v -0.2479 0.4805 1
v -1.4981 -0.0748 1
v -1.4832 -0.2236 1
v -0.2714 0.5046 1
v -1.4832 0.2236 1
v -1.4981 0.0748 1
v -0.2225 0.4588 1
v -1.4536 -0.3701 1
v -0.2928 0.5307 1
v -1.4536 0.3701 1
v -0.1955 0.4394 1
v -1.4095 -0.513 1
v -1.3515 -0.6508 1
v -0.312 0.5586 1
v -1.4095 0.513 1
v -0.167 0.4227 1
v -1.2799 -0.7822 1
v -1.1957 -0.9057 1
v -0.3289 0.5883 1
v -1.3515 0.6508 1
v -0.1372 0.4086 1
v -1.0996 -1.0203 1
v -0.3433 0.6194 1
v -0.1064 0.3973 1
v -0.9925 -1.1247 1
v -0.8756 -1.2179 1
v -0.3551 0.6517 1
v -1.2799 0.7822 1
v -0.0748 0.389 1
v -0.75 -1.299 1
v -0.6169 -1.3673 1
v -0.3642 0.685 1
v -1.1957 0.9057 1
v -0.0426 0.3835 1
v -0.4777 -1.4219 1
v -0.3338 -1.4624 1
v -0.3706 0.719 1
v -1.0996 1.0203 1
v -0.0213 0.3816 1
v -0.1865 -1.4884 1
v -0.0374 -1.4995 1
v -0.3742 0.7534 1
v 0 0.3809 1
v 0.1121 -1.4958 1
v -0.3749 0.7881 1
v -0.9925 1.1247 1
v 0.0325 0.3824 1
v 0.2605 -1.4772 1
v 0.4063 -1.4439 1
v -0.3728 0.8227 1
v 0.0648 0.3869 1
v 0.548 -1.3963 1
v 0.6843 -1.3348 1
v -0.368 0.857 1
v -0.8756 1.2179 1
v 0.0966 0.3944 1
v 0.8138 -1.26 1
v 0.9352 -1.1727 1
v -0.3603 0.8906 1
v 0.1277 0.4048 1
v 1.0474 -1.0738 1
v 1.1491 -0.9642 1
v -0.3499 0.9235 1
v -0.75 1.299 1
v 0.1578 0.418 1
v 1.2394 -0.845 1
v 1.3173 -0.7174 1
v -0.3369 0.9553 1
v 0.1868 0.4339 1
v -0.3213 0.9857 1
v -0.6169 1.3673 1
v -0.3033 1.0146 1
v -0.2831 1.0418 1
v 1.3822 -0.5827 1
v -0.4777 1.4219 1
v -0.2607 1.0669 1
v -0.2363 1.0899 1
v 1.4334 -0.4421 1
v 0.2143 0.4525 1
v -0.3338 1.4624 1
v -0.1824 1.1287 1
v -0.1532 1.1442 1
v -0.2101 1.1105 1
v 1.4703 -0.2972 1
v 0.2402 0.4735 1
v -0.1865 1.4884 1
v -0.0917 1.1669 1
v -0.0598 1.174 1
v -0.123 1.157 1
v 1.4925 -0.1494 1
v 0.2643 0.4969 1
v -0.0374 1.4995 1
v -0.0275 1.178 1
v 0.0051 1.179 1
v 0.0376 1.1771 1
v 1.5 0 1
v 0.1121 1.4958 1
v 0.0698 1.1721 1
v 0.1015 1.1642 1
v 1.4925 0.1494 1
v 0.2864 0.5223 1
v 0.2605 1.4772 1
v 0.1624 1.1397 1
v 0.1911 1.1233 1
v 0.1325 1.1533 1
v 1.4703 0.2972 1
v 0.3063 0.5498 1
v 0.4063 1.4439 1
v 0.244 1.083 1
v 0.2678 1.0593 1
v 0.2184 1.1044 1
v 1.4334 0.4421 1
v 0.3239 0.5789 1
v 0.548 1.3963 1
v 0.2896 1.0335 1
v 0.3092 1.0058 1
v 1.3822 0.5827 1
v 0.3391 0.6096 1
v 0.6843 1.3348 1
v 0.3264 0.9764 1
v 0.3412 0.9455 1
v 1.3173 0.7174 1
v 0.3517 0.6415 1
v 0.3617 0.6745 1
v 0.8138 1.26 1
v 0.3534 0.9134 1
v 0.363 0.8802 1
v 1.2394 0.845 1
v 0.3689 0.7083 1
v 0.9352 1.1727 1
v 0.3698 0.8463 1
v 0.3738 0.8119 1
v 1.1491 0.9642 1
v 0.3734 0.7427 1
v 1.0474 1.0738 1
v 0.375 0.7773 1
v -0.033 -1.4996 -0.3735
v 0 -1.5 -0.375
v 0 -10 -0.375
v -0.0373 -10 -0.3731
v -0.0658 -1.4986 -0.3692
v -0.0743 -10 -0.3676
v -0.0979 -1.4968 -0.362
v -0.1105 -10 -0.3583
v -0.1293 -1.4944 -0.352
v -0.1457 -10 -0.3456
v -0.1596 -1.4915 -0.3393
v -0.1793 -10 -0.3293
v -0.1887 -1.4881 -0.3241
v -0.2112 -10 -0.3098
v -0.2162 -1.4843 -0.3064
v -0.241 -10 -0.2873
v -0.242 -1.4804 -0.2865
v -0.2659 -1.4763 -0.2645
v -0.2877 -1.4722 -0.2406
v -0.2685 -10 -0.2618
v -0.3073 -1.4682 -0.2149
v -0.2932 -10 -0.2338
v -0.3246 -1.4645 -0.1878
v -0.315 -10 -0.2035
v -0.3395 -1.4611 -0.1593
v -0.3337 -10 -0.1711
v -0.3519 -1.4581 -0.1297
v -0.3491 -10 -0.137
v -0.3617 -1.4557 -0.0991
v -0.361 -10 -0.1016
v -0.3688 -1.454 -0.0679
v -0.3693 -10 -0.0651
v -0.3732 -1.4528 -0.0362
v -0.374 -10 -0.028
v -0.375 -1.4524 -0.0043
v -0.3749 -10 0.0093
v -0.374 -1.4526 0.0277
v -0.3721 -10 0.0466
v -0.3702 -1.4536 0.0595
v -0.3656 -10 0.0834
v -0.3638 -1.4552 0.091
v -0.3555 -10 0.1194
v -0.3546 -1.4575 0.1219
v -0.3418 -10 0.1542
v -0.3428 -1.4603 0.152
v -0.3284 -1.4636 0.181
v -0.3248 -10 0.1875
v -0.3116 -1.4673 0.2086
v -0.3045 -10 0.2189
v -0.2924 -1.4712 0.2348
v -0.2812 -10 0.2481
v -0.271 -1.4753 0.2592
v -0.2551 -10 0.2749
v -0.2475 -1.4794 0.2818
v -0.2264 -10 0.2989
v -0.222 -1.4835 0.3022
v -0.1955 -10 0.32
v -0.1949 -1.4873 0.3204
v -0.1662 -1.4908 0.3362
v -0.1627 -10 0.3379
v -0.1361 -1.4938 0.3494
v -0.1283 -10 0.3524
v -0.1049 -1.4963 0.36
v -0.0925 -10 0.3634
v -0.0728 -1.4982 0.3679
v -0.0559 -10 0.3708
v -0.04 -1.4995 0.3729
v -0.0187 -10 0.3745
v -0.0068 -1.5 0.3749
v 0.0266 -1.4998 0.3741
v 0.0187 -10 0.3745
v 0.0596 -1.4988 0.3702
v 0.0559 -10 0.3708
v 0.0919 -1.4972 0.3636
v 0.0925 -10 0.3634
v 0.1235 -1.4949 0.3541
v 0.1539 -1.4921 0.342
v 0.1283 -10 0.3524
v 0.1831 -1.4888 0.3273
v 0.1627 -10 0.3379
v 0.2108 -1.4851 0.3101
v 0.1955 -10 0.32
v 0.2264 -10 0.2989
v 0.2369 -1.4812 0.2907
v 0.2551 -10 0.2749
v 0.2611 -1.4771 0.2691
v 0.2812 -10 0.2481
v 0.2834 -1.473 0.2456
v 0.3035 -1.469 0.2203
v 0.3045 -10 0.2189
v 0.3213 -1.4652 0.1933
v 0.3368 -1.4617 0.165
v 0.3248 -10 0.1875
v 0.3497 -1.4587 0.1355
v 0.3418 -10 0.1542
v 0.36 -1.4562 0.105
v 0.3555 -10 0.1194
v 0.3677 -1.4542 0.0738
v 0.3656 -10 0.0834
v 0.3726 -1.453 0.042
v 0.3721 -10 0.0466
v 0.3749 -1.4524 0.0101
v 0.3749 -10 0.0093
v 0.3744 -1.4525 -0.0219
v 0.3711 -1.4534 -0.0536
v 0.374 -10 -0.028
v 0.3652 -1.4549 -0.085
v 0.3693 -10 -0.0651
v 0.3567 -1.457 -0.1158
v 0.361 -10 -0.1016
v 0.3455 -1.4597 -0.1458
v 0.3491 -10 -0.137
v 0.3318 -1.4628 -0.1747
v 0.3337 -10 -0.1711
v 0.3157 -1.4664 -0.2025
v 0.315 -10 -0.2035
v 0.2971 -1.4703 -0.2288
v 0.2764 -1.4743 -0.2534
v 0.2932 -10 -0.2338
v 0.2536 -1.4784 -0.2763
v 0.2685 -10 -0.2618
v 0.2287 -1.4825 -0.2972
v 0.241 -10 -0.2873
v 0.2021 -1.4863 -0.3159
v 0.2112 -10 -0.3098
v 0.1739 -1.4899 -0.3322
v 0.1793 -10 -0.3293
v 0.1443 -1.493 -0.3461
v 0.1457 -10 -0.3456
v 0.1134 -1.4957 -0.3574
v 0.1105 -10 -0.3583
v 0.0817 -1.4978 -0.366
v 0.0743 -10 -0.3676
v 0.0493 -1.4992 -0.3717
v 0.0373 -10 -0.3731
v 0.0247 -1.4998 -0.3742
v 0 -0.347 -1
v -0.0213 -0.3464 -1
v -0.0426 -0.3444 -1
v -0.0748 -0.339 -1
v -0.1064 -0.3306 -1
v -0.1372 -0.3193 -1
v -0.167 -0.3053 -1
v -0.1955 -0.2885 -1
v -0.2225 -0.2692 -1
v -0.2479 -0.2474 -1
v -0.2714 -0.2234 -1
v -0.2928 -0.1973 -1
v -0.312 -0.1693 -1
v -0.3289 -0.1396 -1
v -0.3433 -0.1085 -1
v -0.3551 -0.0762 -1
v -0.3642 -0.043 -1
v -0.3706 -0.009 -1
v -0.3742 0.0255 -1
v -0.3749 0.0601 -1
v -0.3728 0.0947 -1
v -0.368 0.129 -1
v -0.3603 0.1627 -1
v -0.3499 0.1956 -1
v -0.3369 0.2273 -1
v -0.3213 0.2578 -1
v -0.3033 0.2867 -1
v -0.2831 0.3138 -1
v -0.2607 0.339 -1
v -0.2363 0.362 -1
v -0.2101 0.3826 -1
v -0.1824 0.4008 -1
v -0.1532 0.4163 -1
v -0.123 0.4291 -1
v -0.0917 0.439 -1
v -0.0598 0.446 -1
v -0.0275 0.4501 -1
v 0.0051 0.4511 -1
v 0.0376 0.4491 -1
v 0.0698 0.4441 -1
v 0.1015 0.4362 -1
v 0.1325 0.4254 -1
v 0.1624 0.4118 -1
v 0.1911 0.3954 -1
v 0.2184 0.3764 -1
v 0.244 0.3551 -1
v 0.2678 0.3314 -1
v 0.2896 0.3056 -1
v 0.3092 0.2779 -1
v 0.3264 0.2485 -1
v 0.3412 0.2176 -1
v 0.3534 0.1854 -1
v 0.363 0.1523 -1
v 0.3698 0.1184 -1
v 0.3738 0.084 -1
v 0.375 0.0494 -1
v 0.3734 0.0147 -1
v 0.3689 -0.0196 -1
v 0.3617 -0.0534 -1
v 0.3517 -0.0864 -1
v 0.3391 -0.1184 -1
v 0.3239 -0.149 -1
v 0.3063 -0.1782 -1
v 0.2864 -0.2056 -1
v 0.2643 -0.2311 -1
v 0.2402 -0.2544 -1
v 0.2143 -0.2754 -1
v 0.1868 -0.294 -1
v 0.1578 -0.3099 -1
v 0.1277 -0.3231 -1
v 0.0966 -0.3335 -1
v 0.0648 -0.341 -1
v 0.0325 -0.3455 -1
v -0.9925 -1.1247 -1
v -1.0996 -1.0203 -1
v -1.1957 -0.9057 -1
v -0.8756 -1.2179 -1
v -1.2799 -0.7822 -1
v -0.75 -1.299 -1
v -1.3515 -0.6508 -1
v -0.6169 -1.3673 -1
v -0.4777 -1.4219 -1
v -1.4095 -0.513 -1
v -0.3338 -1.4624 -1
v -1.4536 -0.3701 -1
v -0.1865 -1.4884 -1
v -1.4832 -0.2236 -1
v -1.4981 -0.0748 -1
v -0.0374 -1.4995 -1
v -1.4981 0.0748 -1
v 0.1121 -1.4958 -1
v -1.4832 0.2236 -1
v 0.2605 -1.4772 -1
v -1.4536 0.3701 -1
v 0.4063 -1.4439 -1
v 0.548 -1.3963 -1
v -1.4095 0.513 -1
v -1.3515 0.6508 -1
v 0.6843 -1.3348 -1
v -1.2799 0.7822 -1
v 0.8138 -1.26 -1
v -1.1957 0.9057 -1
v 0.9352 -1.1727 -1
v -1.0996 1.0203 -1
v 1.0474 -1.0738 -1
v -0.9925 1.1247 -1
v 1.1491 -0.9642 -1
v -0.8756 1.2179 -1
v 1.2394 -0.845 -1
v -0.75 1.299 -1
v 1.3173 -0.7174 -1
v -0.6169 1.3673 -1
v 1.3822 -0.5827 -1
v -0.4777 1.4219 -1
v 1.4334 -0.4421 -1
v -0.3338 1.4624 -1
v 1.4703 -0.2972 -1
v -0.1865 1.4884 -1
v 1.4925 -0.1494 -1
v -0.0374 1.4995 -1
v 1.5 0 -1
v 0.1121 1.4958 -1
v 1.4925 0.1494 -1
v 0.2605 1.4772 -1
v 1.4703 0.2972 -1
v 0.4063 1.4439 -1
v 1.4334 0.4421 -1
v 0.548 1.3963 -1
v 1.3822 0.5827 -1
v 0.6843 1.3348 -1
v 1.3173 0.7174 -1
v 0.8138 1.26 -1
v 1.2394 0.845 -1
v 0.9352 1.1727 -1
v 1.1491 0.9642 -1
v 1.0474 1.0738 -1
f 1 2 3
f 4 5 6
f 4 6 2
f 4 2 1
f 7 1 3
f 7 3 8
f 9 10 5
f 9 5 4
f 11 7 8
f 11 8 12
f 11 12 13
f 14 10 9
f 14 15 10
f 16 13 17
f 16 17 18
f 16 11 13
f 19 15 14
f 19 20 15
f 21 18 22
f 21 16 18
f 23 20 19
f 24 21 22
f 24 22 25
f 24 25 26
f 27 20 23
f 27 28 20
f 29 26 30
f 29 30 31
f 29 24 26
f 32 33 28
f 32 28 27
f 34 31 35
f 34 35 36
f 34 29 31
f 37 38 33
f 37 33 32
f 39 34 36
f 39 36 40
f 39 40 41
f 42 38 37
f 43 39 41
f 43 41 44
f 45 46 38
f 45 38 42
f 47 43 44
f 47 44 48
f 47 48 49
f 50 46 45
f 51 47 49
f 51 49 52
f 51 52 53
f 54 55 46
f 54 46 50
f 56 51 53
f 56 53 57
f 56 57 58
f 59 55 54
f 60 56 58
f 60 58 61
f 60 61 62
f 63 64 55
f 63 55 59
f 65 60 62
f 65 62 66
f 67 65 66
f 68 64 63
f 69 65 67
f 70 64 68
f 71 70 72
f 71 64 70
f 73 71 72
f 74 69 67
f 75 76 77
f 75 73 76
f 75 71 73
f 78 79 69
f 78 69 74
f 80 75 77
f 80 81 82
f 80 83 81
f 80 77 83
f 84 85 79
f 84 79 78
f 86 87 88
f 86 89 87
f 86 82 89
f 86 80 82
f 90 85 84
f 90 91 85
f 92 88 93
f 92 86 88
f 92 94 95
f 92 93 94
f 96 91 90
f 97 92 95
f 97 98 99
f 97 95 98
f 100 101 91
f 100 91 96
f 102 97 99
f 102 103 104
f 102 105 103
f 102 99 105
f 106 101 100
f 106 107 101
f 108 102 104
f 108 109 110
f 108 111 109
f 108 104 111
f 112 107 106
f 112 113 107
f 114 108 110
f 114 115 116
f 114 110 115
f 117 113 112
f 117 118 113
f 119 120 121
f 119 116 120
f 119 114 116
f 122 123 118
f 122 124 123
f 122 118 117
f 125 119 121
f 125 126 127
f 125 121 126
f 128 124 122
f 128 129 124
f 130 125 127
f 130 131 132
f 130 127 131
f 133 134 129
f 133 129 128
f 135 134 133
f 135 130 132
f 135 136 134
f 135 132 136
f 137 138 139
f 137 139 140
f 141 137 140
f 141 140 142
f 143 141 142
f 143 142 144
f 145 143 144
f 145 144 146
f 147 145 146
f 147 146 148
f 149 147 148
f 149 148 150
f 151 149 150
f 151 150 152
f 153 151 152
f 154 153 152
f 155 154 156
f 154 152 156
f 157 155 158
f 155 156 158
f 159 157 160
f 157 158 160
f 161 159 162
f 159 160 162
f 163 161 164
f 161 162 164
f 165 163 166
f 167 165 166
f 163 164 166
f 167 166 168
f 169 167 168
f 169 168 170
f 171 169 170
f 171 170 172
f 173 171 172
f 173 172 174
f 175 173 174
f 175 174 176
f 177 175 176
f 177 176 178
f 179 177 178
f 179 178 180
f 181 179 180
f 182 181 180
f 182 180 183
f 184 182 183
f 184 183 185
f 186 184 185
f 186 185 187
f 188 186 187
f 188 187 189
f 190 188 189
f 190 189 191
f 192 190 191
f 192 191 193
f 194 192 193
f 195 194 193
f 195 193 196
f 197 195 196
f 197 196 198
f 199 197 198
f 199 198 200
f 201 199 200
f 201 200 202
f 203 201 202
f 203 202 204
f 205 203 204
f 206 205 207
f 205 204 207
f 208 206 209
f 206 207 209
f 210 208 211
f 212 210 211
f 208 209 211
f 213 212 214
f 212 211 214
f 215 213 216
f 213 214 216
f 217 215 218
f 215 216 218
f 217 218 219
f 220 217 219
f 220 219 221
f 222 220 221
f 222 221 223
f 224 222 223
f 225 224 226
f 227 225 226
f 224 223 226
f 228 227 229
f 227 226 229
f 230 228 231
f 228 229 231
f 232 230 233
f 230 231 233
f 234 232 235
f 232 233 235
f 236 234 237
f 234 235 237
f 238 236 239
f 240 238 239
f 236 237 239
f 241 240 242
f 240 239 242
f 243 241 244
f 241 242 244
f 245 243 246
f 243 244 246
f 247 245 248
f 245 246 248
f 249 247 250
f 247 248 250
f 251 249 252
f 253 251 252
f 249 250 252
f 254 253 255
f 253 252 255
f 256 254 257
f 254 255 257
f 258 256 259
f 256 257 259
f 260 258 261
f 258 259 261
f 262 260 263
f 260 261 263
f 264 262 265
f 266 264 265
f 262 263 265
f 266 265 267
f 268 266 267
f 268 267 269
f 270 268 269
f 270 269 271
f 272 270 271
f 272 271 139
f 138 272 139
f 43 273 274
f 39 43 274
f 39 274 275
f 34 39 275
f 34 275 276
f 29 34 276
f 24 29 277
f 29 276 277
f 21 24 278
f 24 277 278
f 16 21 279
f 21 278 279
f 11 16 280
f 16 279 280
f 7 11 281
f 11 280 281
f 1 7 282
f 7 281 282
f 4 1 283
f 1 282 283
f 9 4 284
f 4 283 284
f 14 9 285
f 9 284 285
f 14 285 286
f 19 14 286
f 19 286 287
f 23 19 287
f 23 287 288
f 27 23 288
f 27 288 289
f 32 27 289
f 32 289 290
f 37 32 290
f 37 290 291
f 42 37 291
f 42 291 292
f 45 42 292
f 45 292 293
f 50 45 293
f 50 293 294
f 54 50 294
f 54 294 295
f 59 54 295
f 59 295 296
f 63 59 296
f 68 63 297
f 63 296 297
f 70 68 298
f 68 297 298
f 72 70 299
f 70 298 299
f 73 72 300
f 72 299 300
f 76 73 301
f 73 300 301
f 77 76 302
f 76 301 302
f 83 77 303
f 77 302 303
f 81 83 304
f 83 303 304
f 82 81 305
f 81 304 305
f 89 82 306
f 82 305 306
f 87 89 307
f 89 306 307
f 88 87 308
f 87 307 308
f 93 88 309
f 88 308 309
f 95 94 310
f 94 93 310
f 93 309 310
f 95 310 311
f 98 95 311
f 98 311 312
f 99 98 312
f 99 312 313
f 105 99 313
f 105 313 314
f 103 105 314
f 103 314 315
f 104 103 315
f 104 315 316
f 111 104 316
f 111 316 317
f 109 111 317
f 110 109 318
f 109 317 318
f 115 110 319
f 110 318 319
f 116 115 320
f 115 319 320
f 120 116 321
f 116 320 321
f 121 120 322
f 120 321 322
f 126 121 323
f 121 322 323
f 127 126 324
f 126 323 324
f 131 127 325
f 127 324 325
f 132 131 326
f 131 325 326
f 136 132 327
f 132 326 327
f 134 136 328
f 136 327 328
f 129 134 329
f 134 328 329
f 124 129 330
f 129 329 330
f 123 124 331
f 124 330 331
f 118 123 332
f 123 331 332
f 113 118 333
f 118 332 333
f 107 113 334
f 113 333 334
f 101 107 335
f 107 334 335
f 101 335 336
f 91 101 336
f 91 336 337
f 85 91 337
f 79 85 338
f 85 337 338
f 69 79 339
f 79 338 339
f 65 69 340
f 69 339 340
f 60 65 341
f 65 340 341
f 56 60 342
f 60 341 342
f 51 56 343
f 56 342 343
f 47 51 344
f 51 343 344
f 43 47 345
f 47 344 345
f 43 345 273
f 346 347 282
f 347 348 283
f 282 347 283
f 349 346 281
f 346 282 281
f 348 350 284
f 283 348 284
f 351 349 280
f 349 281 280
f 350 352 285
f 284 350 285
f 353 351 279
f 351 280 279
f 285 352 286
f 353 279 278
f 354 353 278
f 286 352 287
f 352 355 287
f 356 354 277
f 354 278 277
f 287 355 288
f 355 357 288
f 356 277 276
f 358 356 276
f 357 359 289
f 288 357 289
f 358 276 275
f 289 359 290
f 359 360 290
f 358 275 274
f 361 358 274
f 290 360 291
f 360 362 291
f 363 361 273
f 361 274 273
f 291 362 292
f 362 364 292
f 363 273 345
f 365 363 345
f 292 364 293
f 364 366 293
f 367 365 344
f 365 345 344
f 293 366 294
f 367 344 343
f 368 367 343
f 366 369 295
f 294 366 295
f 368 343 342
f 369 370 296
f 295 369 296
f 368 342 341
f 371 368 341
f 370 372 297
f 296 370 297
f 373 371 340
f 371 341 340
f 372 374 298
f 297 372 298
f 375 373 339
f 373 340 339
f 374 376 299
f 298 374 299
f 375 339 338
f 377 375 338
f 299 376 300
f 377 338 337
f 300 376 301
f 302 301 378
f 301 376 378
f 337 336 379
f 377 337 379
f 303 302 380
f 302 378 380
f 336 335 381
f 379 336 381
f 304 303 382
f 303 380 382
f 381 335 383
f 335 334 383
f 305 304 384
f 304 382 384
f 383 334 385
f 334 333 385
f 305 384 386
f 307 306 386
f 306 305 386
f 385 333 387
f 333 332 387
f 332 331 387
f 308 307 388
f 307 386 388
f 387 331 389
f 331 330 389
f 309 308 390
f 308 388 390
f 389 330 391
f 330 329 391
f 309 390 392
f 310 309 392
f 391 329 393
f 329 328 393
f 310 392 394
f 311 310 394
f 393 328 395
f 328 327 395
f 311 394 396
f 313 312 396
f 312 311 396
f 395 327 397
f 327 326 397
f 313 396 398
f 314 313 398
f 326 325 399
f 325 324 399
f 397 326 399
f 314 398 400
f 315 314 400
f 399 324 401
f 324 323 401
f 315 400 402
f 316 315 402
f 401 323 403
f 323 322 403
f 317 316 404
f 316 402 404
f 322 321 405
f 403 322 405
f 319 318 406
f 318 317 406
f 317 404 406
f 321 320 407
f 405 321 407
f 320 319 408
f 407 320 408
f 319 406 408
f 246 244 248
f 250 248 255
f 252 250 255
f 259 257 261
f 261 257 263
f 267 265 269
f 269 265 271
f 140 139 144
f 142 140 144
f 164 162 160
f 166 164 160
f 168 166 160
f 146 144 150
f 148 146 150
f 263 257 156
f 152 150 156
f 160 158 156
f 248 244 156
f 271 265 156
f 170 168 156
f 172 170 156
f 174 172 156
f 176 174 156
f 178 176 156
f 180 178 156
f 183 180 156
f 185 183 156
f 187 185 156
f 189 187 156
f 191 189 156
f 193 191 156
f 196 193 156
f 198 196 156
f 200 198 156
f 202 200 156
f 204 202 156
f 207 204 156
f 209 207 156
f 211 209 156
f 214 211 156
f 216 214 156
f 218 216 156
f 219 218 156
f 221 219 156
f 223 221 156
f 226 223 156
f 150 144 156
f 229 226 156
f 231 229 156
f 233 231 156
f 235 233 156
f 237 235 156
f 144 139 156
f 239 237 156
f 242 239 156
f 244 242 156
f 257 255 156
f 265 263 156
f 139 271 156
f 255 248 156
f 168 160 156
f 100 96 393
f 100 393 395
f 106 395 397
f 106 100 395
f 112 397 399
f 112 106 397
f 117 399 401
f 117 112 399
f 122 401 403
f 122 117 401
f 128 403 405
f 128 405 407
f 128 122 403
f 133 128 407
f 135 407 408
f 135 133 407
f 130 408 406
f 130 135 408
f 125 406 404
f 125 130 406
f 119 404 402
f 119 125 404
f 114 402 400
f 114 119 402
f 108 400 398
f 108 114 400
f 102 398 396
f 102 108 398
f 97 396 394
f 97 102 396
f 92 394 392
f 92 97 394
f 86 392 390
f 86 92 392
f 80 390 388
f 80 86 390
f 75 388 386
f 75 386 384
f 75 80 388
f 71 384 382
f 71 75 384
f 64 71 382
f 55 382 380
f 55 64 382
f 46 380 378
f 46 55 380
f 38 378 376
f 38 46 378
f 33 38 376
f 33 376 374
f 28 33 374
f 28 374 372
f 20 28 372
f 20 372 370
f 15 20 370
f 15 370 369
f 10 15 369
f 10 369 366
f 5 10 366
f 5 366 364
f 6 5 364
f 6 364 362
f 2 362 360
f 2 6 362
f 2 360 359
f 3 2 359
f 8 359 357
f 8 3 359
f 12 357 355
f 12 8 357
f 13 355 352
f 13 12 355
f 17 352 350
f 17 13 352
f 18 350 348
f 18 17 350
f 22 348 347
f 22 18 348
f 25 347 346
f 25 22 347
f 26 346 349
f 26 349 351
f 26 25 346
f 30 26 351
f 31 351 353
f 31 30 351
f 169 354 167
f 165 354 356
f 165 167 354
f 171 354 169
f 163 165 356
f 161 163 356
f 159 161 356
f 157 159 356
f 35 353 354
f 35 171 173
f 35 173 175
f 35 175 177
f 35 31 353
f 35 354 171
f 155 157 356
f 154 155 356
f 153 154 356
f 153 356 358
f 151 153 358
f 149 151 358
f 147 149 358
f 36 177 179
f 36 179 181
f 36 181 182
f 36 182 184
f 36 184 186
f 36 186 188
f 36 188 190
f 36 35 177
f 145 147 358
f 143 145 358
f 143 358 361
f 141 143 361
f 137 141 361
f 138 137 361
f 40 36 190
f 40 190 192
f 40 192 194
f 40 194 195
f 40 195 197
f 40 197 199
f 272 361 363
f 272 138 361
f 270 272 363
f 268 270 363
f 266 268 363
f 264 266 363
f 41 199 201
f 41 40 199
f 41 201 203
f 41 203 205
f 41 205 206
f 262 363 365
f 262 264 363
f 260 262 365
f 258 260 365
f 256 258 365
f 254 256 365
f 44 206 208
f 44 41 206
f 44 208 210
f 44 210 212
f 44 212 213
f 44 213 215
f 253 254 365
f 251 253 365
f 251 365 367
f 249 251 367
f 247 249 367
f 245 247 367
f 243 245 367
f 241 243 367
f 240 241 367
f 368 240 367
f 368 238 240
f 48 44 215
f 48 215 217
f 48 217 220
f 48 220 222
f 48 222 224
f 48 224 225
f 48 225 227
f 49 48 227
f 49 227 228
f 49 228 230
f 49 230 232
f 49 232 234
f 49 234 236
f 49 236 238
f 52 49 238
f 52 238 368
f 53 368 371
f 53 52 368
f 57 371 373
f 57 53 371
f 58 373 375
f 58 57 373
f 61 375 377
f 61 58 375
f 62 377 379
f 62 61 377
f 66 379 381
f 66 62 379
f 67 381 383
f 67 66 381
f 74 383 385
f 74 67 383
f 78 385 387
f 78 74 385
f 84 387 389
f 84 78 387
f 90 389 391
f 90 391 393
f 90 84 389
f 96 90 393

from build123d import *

# Parameters (mm, degrees)
SKETCH1_R                = 1.5
BOSS_EXTRUDE1_DEPTH      = 1
BOSS_EXTRUDE2_REACH      = 13.64
BOSS_EXTRUDE2_END_RADIUS = 1.5
SKETCH6_R                = 0.375
SKETCH7_R                = 0.375
CUT_EXTRUDE1_DEPTH       = 5


with BuildPart() as part:
    # Sketch1 → Boss-Extrude1 (new, symmetric)
    with BuildSketch(Plane.XY):
        Circle(SKETCH1_R)
    extrude(amount=BOSS_EXTRUDE1_DEPTH, both=True)

    # Boss-Extrude2: up to this cylinder (the profile starts outside it)
    boss_extrude2_end = Plane(origin=(0, 0, 0), z_dir=(0, 0, -1)) * Cylinder(BOSS_EXTRUDE2_END_RADIUS, 31.28, mode=Mode.PRIVATE)
    # Sketch6 → Boss-Extrude2 (add, up to the surface)
    with BuildSketch(Plane(origin=(0, -10, 0), x_dir=(1, 0, 0), z_dir=(0, 1, 0)), mode=Mode.PRIVATE) as boss_extrude2_sk1:
        with Locations(Location((0, 0, 0), (0, 0, 90))):
            Circle(SKETCH6_R)
    boss_extrude2_tool1 = extrude(boss_extrude2_sk1.sketch, amount=BOSS_EXTRUDE2_REACH, mode=Mode.PRIVATE) - boss_extrude2_end
    add(boss_extrude2_tool1.solids().sort_by_distance((0, -10, 0))[0])

    # Sketch7 → Cut-Extrude1 (cut, symmetric)
    with BuildSketch(Plane(origin=(0, 0.78, 1), x_dir=(-1, 0, 0), z_dir=(0, -0.34202014332566943, -0.9396926207859082))):
        with Locations(Location((0, 0, 0), (0, 0, 270))):
            Circle(SKETCH7_R)
    extrude(amount=CUT_EXTRUDE1_DEPTH, both=True, mode=Mode.SUBTRACT)


solid = part.part
